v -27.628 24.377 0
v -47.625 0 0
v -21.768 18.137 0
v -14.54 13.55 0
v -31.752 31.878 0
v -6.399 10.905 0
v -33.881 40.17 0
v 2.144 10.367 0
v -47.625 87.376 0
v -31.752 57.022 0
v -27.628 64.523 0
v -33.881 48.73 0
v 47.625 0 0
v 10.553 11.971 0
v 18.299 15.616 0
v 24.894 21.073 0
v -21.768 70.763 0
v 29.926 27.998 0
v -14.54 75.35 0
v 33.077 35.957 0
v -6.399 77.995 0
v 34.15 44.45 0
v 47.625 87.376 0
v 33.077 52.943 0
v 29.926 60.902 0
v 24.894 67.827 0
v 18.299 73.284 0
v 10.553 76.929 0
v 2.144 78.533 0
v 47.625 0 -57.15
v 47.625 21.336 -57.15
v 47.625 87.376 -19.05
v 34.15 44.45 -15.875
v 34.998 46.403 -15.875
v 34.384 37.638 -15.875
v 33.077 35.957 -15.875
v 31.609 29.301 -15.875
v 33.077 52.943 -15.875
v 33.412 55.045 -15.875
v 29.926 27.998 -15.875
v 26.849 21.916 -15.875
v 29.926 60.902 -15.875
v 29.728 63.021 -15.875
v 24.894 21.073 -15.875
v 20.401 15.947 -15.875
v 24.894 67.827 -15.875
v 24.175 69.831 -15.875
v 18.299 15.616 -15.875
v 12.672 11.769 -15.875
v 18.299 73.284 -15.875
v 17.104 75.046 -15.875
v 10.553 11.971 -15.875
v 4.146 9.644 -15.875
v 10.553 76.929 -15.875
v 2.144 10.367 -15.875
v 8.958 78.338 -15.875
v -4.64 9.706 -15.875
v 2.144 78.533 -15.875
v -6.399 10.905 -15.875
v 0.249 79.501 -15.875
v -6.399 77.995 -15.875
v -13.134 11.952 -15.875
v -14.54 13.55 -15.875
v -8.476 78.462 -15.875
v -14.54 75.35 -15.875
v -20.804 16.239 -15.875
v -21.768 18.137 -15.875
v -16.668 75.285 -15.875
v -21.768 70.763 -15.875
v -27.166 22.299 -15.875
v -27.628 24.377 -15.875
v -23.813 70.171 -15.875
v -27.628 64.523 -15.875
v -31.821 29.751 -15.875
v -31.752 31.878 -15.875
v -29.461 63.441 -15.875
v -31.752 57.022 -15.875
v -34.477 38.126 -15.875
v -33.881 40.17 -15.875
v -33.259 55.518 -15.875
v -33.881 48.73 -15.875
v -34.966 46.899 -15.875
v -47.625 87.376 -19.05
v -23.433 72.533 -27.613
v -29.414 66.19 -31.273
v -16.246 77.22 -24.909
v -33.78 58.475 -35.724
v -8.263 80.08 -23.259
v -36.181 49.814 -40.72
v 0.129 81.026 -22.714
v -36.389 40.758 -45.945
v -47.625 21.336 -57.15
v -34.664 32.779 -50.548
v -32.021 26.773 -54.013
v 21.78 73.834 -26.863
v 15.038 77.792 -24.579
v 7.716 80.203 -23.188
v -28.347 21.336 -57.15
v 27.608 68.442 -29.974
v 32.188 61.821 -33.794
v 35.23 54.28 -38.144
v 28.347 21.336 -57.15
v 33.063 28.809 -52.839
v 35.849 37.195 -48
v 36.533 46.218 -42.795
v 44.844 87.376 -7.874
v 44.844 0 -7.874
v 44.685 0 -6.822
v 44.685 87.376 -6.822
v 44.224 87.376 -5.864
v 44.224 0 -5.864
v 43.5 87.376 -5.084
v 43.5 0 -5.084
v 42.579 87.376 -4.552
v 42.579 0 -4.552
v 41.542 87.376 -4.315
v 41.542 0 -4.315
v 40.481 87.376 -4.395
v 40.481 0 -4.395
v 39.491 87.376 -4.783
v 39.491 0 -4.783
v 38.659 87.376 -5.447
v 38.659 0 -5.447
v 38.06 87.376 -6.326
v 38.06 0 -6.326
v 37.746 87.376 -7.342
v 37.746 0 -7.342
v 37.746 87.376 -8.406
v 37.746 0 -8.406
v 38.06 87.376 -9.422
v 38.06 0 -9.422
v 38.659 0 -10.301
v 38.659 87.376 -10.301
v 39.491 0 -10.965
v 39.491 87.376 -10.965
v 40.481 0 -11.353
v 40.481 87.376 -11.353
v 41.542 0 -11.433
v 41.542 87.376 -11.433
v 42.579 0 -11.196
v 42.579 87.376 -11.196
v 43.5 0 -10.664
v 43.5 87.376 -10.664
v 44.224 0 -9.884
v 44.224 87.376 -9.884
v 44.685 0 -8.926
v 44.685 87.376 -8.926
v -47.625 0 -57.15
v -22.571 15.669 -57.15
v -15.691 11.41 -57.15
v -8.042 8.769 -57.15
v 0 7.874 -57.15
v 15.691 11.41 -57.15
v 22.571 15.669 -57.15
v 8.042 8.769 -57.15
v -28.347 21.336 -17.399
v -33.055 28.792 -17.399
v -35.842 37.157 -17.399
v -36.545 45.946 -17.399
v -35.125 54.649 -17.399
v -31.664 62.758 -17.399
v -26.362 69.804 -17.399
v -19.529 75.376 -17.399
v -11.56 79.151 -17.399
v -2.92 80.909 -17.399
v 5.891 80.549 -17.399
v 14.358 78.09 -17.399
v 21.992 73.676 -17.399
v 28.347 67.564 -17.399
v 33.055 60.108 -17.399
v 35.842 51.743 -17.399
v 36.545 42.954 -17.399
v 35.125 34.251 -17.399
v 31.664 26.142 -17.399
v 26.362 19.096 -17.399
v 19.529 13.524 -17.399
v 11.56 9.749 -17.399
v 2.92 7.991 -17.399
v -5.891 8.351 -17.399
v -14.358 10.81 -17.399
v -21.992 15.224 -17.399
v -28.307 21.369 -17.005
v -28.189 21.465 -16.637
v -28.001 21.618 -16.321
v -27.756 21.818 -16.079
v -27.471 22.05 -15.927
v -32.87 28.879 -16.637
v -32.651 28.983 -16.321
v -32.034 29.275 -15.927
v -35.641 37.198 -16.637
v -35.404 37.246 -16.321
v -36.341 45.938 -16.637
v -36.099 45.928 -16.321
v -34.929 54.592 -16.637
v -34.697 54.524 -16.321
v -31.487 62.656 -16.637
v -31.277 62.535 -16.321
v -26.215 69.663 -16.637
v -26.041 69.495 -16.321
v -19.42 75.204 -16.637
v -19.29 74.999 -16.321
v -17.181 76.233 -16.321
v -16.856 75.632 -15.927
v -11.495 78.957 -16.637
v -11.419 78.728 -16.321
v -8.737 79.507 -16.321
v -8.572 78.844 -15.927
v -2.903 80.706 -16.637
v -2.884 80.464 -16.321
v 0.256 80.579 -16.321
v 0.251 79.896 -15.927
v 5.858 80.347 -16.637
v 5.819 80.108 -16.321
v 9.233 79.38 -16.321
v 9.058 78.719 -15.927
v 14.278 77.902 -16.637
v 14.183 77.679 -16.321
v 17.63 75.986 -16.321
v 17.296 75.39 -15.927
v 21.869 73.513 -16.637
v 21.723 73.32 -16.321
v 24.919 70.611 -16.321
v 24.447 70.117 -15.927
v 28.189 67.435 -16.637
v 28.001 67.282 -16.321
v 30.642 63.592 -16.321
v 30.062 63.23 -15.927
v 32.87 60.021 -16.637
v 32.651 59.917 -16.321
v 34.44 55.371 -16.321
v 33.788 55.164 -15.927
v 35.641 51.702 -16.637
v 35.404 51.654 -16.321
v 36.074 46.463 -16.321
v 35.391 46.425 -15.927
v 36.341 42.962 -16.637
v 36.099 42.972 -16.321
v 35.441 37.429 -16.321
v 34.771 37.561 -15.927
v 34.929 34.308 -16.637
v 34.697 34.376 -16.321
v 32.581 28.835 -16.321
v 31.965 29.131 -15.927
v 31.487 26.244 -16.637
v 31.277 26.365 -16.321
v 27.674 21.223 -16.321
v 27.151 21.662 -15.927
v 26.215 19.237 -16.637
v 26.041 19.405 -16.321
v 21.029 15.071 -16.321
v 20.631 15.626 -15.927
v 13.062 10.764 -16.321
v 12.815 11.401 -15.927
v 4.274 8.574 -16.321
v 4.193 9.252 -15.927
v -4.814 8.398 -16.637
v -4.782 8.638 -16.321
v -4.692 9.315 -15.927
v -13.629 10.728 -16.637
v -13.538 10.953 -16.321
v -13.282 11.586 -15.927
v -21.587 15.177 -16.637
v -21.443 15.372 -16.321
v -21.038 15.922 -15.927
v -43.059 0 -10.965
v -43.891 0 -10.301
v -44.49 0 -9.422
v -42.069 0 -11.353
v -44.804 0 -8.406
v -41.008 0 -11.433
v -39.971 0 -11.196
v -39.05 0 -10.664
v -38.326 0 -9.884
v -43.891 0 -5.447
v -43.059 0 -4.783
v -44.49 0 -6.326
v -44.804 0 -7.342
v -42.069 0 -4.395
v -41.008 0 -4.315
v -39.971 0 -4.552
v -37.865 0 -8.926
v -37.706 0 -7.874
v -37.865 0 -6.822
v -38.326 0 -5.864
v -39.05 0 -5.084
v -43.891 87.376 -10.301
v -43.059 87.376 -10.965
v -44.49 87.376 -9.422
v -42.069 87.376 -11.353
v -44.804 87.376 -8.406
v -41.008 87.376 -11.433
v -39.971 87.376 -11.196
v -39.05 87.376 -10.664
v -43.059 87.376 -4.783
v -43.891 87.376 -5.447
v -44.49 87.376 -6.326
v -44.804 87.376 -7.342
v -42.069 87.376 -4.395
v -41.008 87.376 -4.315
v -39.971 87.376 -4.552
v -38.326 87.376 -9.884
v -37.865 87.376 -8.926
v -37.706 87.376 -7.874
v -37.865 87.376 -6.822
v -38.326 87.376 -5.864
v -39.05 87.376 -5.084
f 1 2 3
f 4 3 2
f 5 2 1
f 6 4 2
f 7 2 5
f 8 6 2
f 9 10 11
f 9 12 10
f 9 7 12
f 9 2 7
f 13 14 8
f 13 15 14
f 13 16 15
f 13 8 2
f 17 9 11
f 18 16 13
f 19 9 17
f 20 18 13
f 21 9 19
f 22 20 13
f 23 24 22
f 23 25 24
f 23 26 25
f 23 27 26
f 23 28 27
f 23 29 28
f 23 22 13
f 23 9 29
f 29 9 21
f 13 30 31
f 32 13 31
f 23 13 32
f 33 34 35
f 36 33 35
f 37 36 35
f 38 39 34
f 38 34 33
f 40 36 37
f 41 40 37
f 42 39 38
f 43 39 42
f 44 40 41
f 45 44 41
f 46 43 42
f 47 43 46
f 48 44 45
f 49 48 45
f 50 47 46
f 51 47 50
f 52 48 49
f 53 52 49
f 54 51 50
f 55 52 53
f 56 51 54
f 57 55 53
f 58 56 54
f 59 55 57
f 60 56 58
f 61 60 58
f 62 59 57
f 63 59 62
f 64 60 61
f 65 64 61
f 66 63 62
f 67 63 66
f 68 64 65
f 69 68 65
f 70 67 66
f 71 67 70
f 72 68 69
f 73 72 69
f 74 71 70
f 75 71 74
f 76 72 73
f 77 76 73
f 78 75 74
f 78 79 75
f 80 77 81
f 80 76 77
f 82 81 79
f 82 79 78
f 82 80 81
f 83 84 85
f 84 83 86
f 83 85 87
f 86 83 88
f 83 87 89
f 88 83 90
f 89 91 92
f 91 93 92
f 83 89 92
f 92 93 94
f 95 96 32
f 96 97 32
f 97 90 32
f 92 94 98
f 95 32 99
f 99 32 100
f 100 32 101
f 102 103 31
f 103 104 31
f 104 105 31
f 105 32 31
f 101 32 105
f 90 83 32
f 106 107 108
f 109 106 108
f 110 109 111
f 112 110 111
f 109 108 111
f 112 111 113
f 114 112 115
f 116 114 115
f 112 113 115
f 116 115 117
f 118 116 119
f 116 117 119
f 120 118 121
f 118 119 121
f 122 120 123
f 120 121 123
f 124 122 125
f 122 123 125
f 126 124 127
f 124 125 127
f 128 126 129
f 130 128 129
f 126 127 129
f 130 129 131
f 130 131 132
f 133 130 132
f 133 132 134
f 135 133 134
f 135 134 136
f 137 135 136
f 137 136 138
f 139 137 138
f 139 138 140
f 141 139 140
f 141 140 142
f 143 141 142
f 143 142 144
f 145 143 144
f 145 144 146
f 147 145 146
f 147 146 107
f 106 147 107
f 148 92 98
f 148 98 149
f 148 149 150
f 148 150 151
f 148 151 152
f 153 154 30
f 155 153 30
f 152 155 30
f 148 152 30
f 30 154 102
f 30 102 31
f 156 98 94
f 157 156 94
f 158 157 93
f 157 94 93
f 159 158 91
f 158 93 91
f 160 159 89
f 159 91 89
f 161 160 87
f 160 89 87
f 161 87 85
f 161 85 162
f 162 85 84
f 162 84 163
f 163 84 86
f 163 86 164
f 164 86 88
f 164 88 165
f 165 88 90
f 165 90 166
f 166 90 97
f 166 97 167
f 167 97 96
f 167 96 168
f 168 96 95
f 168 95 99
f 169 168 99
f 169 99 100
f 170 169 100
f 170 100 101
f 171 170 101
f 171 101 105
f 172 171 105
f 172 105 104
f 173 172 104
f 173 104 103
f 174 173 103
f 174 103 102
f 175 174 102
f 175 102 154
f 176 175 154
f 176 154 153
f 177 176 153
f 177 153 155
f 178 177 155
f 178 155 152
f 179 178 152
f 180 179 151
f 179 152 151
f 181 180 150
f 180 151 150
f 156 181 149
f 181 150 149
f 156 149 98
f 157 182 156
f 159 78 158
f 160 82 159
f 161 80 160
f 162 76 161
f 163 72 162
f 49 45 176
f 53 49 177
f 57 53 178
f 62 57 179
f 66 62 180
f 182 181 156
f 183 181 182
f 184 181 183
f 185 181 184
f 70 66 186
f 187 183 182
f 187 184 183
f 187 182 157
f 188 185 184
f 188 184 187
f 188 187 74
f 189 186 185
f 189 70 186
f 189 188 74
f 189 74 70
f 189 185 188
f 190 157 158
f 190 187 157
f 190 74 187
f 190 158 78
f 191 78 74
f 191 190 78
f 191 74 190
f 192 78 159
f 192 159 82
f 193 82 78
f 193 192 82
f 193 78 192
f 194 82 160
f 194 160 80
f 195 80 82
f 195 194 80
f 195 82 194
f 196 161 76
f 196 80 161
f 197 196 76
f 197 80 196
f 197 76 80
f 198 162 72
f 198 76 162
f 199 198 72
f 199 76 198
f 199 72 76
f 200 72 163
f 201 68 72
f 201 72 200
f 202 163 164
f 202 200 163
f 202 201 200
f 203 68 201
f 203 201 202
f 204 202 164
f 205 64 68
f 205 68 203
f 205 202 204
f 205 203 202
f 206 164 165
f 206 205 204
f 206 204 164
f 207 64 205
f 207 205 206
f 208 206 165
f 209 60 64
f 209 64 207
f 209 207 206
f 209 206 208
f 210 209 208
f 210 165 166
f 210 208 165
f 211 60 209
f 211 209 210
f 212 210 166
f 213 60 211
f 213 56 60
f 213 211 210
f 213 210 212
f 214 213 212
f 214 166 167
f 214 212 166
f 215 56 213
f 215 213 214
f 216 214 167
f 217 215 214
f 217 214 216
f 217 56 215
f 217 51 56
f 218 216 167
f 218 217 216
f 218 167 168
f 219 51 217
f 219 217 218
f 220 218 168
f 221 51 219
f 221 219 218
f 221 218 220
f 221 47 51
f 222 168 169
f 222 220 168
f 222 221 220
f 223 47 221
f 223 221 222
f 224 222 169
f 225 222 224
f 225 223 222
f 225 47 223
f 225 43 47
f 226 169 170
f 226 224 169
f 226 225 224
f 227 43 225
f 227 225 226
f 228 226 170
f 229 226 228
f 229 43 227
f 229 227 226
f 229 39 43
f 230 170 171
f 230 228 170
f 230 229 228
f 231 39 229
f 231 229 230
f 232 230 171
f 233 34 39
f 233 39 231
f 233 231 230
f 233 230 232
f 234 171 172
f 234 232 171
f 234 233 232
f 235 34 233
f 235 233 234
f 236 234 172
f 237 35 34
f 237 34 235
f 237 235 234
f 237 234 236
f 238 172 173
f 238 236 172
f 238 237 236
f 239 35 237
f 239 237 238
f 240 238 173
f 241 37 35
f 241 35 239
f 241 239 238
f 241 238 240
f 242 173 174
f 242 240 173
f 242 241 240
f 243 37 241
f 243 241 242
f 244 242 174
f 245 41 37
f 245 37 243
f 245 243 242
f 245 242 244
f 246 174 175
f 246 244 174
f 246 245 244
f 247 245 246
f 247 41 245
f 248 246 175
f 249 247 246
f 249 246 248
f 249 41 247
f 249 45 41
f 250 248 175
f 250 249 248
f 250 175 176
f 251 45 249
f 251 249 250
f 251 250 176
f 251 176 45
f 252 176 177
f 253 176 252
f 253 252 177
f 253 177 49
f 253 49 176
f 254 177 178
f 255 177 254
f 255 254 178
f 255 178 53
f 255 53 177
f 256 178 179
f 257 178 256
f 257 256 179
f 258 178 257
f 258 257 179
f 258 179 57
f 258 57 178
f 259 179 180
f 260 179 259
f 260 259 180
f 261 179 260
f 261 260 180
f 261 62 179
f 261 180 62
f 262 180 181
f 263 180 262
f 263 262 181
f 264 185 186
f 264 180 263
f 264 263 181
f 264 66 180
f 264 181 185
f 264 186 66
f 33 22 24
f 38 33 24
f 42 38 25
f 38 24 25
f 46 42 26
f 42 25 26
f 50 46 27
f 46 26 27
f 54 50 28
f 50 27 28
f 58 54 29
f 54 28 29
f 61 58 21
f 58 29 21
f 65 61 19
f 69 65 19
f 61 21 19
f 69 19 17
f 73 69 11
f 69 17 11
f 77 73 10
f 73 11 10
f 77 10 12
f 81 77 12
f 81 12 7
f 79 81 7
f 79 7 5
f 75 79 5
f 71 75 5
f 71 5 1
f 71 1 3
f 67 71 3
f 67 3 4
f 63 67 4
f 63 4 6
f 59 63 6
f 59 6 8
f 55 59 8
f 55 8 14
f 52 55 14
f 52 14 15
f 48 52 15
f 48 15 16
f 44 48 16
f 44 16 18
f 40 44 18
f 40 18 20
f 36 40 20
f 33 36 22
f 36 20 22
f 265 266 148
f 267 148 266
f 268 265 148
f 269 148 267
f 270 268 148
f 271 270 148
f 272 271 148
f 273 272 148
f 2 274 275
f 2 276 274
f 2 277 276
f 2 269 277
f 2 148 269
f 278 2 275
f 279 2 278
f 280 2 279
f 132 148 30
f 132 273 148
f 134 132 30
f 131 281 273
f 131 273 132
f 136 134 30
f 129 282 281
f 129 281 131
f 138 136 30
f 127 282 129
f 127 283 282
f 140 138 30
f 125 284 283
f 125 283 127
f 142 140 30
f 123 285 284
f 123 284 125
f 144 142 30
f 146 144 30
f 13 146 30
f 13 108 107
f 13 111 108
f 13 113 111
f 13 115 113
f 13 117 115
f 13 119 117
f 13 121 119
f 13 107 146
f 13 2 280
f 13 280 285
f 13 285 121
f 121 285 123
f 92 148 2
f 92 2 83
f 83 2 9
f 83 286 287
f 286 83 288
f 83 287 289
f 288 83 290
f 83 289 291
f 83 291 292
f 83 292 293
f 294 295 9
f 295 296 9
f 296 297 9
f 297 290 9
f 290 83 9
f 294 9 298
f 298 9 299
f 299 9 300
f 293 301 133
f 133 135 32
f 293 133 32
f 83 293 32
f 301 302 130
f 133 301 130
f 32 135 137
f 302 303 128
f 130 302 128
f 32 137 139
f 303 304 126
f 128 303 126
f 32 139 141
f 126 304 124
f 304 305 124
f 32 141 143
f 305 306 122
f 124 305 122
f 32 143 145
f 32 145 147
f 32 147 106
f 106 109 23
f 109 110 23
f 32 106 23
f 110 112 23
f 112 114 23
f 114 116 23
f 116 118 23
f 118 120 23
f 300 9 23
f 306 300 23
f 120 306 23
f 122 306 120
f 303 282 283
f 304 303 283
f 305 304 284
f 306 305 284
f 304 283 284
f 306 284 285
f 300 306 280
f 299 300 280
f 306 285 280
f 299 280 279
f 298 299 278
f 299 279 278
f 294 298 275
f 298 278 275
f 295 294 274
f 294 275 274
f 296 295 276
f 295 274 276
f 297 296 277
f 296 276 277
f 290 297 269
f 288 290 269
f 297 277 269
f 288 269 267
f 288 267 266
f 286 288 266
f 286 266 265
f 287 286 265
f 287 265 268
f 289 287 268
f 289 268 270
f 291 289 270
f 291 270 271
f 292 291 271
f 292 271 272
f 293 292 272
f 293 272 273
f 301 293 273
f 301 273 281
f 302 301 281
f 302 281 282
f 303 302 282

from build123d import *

# Parameters (mm, degrees)
SKETCH1_W          = 95.25
SKETCH1_H          = 87.376
SKETCH1_R          = 34.1503
EXTRUDE1_DEPTH     = 57.15
CUT_EXTRUDE1_DEPTH = 96.25
SKETCH3_R          = 36.576
CUT_EXTRUDE2_DEPTH = 41.275
FILLET1_R          = 1.524
HOLE1_D            = 7.1374
HOLE1_DEPTH        = 87.376


with BuildPart() as part:
    # Sketch1 → Extrude1 (new body)
    with BuildSketch(Plane.XY):
        with Locations((0, 43.688)):
            Rectangle(SKETCH1_W, SKETCH1_H)
        with Locations((0, 44.45)):
            Circle(SKETCH1_R, mode=Mode.SUBTRACT)
    extrude(amount=-EXTRUDE1_DEPTH)

    # Sketch2 → Cut-Extrude1 (cut, through all)
    with BuildSketch(Plane(origin=(47.625, 0, 0), x_dir=(0, 0, -1), z_dir=(1, 0, 0))):
        Polygon((19.05, 87.376), (57.15, 21.336), (57.15, 87.376), align=None)
    extrude(amount=-CUT_EXTRUDE1_DEPTH, mode=Mode.SUBTRACT)

    # Sketch3 → Cut-Extrude2 (cut)
    with BuildSketch(Plane(origin=(0, 0, -57.15), x_dir=(-1, 0, 0), z_dir=(0, 0, -1))):
        with Locations(Location((0, 44.45, 0), (0, 0, 320.806273741))):  # turned: the seam where the file's is
            Circle(SKETCH3_R)
    extrude(amount=-CUT_EXTRUDE2_DEPTH, mode=Mode.SUBTRACT)

    # Fillet1
    fillet1_edges = [part.edges().sort_by_distance(p)[0] for p in [
        (28.346900713, 67.564, -15.875),
    ]]
    fillet(fillet1_edges, radius=FILLET1_R)

    # Hole1
    with Locations(Plane(origin=(0, 87.376, 0), x_dir=(-1, 0, 0), z_dir=(0, 1, 0))):
        with Locations((41.275, -7.874), (-41.275, -7.874)):
            Hole(HOLE1_D / 2, depth=HOLE1_DEPTH)


solid = part.part
